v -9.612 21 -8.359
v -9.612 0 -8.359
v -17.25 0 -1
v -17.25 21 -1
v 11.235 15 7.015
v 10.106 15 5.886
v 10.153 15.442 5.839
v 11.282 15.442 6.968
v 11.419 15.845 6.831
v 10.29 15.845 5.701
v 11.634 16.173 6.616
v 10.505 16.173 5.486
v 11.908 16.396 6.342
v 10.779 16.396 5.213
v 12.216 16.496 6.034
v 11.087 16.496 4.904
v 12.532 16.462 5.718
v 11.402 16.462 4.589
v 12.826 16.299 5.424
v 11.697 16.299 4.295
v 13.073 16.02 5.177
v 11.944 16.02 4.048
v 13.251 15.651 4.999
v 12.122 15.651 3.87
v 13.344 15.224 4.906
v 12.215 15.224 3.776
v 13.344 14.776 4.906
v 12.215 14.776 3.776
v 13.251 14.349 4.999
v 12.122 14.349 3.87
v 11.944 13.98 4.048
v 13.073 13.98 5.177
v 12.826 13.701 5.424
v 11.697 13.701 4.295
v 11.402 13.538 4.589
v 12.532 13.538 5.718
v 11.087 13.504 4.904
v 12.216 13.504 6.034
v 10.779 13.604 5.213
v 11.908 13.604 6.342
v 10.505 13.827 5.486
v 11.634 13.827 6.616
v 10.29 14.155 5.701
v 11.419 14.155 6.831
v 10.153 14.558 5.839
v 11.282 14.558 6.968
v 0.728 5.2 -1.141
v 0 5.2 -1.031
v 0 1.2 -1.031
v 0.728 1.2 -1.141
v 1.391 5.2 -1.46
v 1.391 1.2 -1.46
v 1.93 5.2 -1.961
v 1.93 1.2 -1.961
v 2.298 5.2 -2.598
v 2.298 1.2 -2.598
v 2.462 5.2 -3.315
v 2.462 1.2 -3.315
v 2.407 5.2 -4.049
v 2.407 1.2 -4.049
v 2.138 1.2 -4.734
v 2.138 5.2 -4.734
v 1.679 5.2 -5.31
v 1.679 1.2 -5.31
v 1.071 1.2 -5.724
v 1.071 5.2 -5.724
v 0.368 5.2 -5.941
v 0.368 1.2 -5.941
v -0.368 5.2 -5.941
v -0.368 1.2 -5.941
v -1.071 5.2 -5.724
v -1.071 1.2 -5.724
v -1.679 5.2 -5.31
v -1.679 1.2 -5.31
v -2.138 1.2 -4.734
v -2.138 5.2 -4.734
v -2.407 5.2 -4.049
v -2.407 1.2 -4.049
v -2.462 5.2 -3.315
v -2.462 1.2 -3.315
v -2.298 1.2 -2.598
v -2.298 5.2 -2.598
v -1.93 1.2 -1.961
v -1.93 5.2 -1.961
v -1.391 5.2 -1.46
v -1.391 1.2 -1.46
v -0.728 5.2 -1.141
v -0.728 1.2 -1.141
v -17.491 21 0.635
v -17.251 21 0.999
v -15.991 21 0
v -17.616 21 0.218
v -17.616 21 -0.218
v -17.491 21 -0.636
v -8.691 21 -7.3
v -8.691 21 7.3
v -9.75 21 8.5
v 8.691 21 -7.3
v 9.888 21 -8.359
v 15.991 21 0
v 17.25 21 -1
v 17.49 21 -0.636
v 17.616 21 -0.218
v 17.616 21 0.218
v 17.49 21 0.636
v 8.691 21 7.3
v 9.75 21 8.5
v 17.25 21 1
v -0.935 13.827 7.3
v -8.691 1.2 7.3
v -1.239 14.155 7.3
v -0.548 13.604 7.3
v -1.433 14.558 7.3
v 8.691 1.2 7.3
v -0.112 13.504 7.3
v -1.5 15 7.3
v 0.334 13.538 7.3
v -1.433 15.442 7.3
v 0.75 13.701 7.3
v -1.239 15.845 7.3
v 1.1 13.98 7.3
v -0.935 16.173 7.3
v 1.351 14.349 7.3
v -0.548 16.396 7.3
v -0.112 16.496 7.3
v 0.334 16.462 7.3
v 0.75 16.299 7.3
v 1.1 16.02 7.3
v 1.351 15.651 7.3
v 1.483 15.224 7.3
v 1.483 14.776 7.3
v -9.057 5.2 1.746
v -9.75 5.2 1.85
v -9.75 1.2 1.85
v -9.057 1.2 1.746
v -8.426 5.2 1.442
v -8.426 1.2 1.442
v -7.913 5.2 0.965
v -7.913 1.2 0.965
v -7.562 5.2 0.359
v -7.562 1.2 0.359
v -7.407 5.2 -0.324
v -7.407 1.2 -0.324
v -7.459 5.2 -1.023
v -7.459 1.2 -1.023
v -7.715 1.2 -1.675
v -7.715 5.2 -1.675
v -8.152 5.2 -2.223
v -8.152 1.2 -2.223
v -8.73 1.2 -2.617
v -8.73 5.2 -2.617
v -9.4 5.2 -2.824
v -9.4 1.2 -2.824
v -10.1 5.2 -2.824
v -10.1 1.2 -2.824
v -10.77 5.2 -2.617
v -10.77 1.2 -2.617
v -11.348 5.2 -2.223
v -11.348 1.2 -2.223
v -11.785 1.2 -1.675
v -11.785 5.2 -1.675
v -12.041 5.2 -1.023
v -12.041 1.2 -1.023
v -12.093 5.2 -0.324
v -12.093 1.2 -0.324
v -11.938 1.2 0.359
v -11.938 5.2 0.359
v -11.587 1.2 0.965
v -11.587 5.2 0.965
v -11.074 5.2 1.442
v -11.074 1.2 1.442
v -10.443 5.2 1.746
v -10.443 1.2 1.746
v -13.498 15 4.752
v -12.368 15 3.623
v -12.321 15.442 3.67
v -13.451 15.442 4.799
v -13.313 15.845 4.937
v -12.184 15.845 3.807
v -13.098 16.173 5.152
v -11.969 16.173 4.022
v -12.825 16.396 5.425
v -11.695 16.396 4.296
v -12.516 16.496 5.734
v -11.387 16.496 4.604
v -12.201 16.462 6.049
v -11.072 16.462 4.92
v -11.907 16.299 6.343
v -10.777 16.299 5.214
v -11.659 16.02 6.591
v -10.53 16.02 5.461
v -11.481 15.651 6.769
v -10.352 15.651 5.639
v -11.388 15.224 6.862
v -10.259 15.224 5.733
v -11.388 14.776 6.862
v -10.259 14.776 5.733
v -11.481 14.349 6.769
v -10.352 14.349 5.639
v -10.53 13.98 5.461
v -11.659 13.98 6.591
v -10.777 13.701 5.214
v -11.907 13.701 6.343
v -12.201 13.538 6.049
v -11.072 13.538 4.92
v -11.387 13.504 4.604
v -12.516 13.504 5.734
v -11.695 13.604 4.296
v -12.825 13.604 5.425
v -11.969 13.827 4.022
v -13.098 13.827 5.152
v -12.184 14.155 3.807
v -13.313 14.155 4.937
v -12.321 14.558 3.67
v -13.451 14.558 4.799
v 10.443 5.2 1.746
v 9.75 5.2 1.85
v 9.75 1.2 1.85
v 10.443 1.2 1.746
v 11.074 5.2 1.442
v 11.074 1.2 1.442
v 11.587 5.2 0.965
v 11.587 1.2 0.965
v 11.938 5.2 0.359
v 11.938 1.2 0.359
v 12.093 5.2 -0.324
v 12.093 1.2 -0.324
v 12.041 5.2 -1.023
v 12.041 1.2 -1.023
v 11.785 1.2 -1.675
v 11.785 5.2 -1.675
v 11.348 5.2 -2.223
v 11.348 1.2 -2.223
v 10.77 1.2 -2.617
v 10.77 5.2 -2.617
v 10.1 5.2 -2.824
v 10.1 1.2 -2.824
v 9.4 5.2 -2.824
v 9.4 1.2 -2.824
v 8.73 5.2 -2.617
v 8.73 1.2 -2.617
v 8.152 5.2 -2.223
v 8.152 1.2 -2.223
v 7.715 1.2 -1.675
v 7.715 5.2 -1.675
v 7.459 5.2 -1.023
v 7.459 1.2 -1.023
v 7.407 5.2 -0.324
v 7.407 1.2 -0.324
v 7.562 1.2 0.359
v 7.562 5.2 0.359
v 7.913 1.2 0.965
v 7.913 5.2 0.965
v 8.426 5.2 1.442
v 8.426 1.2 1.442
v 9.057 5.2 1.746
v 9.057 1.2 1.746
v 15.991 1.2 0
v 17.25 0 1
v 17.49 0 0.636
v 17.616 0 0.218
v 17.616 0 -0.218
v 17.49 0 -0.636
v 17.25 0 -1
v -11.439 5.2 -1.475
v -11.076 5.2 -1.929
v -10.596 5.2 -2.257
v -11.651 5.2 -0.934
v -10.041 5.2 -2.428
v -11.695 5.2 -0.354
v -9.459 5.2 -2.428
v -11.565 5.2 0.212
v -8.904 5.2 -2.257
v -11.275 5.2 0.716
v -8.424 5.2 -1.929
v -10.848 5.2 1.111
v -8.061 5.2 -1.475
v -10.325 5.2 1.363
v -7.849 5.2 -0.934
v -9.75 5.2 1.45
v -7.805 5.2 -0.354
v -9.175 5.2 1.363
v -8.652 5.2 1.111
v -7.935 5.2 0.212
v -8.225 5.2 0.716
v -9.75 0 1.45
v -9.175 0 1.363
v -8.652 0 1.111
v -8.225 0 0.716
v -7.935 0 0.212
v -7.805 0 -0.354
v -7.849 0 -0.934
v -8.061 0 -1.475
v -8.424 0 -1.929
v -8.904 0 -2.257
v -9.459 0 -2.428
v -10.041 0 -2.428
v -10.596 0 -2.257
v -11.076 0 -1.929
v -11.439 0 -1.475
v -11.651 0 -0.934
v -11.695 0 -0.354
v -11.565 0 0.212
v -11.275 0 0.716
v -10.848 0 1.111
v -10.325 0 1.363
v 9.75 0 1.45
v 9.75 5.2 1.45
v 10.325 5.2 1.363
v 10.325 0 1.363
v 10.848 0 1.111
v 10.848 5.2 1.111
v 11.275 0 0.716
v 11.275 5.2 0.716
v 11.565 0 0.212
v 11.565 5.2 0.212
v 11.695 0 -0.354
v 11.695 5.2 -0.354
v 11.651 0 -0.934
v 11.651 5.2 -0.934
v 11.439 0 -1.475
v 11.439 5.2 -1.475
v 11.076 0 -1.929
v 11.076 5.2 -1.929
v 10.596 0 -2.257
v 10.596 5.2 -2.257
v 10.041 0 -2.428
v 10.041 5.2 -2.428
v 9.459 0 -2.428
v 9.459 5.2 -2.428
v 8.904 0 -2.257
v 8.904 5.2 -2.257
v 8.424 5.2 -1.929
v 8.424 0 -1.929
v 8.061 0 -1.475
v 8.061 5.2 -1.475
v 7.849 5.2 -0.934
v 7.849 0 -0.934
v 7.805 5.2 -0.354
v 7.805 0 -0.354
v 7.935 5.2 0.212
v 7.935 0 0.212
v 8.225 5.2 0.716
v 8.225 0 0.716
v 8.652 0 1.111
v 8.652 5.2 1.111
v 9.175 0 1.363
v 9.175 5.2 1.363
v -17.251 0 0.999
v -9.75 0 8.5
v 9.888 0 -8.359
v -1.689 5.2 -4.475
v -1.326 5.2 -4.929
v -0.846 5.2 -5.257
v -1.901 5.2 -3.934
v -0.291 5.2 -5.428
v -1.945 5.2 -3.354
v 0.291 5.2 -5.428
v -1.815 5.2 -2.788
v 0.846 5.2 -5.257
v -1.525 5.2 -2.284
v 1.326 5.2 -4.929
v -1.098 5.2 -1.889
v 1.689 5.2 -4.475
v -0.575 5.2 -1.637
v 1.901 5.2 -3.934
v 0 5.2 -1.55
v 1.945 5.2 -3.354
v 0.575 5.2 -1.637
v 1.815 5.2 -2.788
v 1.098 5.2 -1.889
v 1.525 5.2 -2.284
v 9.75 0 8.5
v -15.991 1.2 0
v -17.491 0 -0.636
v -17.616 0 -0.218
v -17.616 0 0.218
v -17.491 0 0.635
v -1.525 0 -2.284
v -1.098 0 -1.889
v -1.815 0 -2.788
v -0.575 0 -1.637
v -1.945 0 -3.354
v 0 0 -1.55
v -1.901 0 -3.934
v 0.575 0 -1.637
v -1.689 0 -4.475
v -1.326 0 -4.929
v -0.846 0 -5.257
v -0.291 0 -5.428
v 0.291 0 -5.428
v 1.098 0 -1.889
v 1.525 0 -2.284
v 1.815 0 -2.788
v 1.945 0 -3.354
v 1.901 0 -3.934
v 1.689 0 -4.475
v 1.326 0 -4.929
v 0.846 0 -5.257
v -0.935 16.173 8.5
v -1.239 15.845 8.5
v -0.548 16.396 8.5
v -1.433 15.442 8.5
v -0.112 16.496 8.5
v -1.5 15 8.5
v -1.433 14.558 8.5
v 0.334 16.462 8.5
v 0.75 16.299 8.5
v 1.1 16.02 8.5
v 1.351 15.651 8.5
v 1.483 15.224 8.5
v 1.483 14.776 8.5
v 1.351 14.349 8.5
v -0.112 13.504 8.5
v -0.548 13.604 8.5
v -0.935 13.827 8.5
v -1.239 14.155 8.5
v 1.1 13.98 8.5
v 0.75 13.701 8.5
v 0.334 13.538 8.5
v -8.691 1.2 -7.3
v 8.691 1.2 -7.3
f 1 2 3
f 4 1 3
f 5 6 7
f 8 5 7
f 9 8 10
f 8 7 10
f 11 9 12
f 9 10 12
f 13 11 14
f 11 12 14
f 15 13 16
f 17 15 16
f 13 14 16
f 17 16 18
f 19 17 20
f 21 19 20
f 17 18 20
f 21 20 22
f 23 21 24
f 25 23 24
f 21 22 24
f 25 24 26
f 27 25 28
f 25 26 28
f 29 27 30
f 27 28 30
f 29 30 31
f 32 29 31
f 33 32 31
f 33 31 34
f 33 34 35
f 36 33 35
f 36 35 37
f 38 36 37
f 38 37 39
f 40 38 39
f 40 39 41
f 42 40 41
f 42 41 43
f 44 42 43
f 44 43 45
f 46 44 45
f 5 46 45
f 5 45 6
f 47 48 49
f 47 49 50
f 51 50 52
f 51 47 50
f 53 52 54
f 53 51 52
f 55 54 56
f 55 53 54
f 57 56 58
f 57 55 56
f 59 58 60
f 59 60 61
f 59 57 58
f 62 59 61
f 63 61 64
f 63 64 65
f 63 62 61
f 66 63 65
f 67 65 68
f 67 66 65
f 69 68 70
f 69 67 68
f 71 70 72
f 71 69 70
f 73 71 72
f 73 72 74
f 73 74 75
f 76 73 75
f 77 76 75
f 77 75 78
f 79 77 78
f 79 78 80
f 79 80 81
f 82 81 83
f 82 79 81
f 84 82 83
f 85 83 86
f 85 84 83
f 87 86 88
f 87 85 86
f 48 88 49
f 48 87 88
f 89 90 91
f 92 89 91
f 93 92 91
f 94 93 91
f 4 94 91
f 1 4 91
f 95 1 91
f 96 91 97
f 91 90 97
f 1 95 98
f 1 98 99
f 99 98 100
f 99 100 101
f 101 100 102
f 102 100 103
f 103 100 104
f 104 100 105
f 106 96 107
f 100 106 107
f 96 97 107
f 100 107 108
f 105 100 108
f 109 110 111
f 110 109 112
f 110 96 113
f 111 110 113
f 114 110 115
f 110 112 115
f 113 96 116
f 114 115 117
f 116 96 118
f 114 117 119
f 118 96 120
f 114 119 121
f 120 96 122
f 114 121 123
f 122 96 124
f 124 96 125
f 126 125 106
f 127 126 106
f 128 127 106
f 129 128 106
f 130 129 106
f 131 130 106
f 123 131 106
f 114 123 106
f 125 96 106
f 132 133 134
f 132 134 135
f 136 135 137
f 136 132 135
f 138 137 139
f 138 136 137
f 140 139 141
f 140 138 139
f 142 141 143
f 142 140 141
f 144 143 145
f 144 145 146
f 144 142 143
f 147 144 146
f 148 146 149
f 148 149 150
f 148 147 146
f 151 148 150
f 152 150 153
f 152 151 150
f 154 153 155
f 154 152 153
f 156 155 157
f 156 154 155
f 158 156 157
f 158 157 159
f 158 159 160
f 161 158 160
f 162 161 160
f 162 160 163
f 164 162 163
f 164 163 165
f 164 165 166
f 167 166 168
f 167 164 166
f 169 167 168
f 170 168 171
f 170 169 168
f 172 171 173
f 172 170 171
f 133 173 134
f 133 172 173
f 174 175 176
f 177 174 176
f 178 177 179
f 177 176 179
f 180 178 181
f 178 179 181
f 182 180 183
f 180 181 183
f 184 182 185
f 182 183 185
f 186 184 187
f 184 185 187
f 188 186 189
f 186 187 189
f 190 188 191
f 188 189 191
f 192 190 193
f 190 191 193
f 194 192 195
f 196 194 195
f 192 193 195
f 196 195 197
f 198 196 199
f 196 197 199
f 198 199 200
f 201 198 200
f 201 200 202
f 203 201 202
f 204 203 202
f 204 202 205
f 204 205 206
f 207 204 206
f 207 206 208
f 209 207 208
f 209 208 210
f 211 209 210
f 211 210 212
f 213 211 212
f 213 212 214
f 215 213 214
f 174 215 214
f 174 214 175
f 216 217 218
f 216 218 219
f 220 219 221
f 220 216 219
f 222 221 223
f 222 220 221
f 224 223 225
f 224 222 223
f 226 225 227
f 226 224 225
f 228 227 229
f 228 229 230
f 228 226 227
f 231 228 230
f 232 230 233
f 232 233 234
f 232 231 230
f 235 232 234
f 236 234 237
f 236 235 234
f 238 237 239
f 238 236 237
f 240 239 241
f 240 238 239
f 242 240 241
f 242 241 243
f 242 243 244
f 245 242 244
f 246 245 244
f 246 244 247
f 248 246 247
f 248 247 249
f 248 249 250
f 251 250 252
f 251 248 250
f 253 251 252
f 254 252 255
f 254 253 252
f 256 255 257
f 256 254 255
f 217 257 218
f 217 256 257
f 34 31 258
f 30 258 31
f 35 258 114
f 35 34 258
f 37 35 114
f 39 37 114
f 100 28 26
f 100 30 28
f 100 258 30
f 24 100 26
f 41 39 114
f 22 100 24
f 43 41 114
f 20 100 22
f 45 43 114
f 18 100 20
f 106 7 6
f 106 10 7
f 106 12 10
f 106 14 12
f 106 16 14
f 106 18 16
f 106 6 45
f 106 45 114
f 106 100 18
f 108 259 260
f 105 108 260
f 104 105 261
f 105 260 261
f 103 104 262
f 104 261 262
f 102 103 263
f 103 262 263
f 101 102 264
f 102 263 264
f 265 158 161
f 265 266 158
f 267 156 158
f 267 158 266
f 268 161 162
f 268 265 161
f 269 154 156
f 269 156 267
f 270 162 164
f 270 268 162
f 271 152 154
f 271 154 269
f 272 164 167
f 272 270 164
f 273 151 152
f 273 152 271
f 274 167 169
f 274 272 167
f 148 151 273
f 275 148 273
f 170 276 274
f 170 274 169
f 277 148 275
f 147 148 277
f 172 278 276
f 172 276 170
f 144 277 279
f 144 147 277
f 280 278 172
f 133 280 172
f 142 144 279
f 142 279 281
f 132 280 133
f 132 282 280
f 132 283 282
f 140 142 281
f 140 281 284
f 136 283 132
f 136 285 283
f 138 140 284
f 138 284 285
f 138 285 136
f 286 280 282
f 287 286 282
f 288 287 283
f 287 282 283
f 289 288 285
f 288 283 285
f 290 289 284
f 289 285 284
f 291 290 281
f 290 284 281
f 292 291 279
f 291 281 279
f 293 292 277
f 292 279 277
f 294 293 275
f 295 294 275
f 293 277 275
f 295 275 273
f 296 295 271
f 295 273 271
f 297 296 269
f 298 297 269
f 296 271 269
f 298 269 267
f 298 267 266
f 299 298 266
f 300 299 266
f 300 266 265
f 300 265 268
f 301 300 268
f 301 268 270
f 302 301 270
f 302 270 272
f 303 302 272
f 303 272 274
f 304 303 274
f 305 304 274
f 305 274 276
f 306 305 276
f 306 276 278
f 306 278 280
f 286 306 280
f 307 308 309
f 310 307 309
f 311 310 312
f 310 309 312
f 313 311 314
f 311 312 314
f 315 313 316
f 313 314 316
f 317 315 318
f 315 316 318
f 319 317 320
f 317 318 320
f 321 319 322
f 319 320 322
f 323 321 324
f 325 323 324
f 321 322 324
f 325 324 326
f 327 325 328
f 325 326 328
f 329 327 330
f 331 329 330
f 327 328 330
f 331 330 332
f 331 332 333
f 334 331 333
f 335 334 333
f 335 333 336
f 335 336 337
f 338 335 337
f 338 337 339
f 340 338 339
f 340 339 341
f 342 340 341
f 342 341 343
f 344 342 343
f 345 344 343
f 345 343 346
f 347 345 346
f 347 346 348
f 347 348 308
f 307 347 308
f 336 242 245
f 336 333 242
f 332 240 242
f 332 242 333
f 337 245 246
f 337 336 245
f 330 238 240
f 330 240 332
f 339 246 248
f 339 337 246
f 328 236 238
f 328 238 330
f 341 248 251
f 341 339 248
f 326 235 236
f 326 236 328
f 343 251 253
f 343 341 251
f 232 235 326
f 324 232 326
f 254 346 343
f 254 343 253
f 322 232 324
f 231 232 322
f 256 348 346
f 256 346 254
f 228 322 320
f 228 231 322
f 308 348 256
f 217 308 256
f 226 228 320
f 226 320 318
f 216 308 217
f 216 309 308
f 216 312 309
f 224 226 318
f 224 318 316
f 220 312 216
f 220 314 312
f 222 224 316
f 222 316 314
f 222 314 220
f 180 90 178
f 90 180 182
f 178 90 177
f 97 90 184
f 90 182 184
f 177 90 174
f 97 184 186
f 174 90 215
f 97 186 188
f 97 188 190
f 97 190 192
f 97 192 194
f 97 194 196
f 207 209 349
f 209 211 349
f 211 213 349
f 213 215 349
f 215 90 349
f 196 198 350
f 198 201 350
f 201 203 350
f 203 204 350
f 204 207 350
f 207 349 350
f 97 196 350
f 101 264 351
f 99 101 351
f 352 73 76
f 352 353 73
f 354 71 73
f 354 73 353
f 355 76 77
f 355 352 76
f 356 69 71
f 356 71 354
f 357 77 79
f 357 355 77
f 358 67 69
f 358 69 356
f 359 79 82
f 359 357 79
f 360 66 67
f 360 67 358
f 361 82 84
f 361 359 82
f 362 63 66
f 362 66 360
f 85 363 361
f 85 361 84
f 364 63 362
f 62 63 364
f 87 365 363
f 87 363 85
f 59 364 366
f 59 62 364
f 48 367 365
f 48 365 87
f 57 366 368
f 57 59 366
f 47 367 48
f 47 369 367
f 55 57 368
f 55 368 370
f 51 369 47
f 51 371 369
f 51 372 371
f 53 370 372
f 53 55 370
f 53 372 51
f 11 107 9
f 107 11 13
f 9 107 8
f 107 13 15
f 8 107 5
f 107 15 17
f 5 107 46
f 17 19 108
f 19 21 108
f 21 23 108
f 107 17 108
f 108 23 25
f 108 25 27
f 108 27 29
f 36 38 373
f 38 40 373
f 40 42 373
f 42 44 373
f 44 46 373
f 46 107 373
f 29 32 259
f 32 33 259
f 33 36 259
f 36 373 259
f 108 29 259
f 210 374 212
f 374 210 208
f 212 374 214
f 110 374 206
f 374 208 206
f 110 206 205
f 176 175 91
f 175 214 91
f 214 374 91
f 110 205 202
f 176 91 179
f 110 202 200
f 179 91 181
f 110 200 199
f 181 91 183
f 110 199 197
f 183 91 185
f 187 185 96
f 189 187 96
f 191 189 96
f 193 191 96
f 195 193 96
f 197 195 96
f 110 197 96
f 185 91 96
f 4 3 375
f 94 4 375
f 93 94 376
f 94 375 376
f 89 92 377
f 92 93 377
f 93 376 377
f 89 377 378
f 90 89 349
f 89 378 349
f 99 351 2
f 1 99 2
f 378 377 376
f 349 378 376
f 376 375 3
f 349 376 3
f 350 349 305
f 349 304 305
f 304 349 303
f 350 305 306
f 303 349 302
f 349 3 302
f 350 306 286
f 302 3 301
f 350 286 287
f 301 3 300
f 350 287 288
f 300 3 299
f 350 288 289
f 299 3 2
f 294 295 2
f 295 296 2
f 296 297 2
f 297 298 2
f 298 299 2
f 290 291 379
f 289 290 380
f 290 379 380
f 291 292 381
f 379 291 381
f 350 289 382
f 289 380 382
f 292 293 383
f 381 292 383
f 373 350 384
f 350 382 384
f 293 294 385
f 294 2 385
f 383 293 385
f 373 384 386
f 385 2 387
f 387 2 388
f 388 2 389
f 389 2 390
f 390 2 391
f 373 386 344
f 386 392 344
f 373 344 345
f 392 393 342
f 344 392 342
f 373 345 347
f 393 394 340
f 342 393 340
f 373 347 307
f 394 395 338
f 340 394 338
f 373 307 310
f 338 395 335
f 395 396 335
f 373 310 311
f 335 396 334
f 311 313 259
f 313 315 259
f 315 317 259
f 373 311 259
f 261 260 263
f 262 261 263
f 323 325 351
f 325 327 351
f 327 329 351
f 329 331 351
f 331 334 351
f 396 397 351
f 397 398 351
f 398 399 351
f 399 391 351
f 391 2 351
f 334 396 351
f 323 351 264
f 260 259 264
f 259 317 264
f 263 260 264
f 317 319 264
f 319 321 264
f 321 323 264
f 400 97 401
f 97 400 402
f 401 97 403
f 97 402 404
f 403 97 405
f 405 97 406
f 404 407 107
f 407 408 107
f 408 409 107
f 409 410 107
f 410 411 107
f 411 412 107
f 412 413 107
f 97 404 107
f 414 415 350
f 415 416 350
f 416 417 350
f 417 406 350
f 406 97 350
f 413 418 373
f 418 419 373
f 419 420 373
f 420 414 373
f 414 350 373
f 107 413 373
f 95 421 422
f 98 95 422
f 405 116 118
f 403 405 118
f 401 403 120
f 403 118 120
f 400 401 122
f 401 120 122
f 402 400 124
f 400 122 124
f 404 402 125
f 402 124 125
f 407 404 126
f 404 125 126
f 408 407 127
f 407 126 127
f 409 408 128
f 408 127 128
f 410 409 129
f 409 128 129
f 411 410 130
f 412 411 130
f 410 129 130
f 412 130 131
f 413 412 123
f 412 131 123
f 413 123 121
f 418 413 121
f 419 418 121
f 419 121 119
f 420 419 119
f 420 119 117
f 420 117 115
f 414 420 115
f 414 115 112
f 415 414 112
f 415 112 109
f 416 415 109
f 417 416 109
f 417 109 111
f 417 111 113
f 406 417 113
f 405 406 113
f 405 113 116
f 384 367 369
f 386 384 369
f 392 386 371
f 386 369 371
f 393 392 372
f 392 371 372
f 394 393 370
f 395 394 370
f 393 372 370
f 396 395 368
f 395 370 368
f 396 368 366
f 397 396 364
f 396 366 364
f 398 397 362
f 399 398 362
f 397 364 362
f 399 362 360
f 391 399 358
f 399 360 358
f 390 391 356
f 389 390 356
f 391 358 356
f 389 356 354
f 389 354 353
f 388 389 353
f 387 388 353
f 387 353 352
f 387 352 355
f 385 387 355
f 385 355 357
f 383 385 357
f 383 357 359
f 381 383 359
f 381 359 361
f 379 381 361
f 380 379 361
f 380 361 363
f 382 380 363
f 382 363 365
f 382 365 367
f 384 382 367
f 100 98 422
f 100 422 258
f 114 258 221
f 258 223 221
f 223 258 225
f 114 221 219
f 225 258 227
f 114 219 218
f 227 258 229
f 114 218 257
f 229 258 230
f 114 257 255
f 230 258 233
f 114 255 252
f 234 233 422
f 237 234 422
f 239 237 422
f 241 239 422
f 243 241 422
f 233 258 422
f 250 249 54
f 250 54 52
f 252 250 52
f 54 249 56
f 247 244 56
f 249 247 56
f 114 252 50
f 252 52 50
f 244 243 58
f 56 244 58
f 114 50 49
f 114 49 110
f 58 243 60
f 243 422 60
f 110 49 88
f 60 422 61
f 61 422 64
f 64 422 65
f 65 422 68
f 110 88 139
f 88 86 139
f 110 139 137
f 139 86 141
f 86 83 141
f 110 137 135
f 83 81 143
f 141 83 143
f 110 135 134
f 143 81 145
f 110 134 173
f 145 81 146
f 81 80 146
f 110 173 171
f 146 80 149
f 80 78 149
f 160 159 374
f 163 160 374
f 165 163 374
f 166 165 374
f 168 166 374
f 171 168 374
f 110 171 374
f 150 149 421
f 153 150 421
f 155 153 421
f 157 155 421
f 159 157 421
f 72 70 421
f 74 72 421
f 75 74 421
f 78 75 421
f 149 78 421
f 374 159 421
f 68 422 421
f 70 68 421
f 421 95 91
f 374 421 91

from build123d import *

# Parameters (mm, degrees)
RESSALTO_EXTRUS_O3_DEPTH  = 25
CORTE_EXTRUS_O1_DEPTH     = 23.8
ESBO_O5_R                 = 1.95
CORTE_EXTRUS_O2_DEPTH     = 23.8
CORTE_EXTRUS_O3_DEPTH     = 23.8
RESSALTO_EXTRUS_O11_START = 4
ESBO_O9_R                 = 2.35
ESBO_O9_R_2               = 1.95
ESBO_O9_R_3               = 2.468896698
RESSALTO_EXTRUS_O11_DEPTH = 4
ESBO_O11_W                = 83.094173182
ESBO_O11_H                = 8
CORTE_EXTRUS_O10_DEPTH    = 30
ESBO_O19_R                = 1.5
CORTE_EXTRUS_O12_DEPTH    = 30
ESBO_O22_R                = 1.5
CORTE_EXTRUS_O13_DEPTH    = 30
ESBO_O23_R                = 1.5
CORTE_EXTRUS_O14_DEPTH    = 30


with BuildPart() as part:
    # Esboço1 → Ressalto-extrusão3 (new body)
    with BuildSketch(Plane(origin=(0, 0, 0), x_dir=(1, 0, 0), z_dir=(0, 1, 0))):
        with BuildLine():
            Line((9.888111981, 8.359296796), (-9.611888019, 8.359296796))
            Line((-9.611888019, 8.359296796), (-17.250307666, 0.999703565))
            ThreePointArc((-17.250307666, 0.999703565), (-17.631966883, 0.000271602), (-17.250692692, -0.999307308))
            Line((-17.250692692, -0.999307308), (-9.75, -8.5))
            Line((-9.75, -8.5), (9.75, -8.5))
            Line((9.75, -8.5), (17.25, -1))
            ThreePointArc((17.25, -1), (17.631966011, 0), (17.25, 1))
            Line((17.25, 1), (9.888111981, 8.359296796))
        make_face()
    extrude(amount=RESSALTO_EXTRUS_O3_DEPTH)

    # Esboço4 → Corte-extrusão1 (cut)
    with BuildSketch(Plane(origin=(0, 25, 0), x_dir=(1, 0, 0), z_dir=(0, 1, 0))):
        Polygon((8.55, 7.3), (-8.55, 7.3), (-15.85, 0), (-8.55, -7.3), (8.55, -7.3), (15.85, 0), align=None)
    extrude(amount=-CORTE_EXTRUS_O1_DEPTH, mode=Mode.SUBTRACT)

    # Esboço5 → Corte-extrusão2 (cut)
    with BuildSketch(Plane(origin=(0, 1.2, 0), x_dir=(1, 0, 0), z_dir=(0, 1, 0))):
        with Locations((0, 3.5)):
            Circle(ESBO_O5_R)
        with Locations((-9.75, 0.5)):
            Circle(ESBO_O5_R)
        with Locations((9.75, 0.5)):
            Circle(ESBO_O5_R)
    extrude(amount=-CORTE_EXTRUS_O2_DEPTH, mode=Mode.SUBTRACT)

    # Esboço7 → Corte-extrusão3 (cut)
    with BuildSketch(Plane(origin=(0, 25, 0), x_dir=(1, 0, 0), z_dir=(0, 1, 0))):
        Polygon((-15.85, 0), (-8.55, 7.3), (-8.691421356, 7.3), (-15.991421356, 0), (-8.691421356, -7.3), (-8.55, -7.3), align=None)
        Polygon((8.691421356, -7.3), (15.991421356, 0), (8.691421356, 7.3), (8.55, 7.3), (15.85, 0), (8.55, -7.3), align=None)
    extrude(amount=-CORTE_EXTRUS_O3_DEPTH, mode=Mode.SUBTRACT)

    # Esboço9 → Ressalto-extrusão11 (add)
    # profile 1 of 3: a face of its own
    with BuildSketch(Plane(origin=(0, 1.2, 0), x_dir=(1, 0, 0), z_dir=(0, 1, 0)).offset(RESSALTO_EXTRUS_O11_START)):
        with Locations((-9.75, 0.5)):
            Circle(ESBO_O9_R)
        with Locations((-9.75, 0.5)):
            Circle(ESBO_O9_R_2, mode=Mode.SUBTRACT)
    # profile 2 of 3: a face of its own
    with BuildSketch(Plane(origin=(0, 1.2, 0), x_dir=(1, 0, 0), z_dir=(0, 1, 0)).offset(RESSALTO_EXTRUS_O11_START)):
        with Locations((0, 3.5)):
            Circle(ESBO_O9_R_3)
        with Locations((0, 3.5)):
            Circle(ESBO_O9_R_2, mode=Mode.SUBTRACT)
    # profile 3 of 3: a face of its own
    with BuildSketch(Plane(origin=(0, 1.2, 0), x_dir=(1, 0, 0), z_dir=(0, 1, 0)).offset(RESSALTO_EXTRUS_O11_START)):
        with Locations((9.75, 0.5)):
            Circle(ESBO_O9_R)
        with Locations((9.75, 0.5)):
            Circle(ESBO_O9_R_2, mode=Mode.SUBTRACT)
    extrude(amount=-RESSALTO_EXTRUS_O11_DEPTH)

    # Esboço11 → Corte-extrusão10 (cut)
    with BuildSketch(Plane.XY.offset(8.5)):
        with Locations((0, 25)):
            Rectangle(ESBO_O11_W, ESBO_O11_H)
    extrude(amount=-CORTE_EXTRUS_O10_DEPTH, mode=Mode.SUBTRACT)

    # Esboço19 → Corte-extrusão12 (cut)
    with BuildSketch(Plane(origin=(7.995710678, 0, 7.995710678), x_dir=(-0.7071067811865476, 0, 0.7071067811865476), z_dir=(-0.7071067811865476, 0, -0.7071067811865476))):
        with Locations((-4.483883476, 15)):
            Circle(ESBO_O19_R)
    extrude(amount=-CORTE_EXTRUS_O12_DEPTH, mode=Mode.SUBTRACT)

    # Esboço22 → Corte-extrusão13 (cut)
    with BuildSketch(Plane(origin=(0, 0, 7.3), x_dir=(-1, 0, 0), z_dir=(0, 0, -1))):
        with Locations((0, 15)):
            Circle(ESBO_O22_R)
    extrude(amount=-CORTE_EXTRUS_O13_DEPTH, mode=Mode.SUBTRACT)

    # Esboço23 → Corte-extrusão14 (cut)
    with BuildSketch(Plane(origin=(-7.995710678, 0, 7.995710678), x_dir=(-0.7071067811865476, 0, -0.7071067811865475), z_dir=(0.7071067811865475, 0, -0.7071067811865476))):
        with Locations((4.683883476, 15)):
            Circle(ESBO_O23_R)
    extrude(amount=-CORTE_EXTRUS_O14_DEPTH, mode=Mode.SUBTRACT)


solid = part.part
